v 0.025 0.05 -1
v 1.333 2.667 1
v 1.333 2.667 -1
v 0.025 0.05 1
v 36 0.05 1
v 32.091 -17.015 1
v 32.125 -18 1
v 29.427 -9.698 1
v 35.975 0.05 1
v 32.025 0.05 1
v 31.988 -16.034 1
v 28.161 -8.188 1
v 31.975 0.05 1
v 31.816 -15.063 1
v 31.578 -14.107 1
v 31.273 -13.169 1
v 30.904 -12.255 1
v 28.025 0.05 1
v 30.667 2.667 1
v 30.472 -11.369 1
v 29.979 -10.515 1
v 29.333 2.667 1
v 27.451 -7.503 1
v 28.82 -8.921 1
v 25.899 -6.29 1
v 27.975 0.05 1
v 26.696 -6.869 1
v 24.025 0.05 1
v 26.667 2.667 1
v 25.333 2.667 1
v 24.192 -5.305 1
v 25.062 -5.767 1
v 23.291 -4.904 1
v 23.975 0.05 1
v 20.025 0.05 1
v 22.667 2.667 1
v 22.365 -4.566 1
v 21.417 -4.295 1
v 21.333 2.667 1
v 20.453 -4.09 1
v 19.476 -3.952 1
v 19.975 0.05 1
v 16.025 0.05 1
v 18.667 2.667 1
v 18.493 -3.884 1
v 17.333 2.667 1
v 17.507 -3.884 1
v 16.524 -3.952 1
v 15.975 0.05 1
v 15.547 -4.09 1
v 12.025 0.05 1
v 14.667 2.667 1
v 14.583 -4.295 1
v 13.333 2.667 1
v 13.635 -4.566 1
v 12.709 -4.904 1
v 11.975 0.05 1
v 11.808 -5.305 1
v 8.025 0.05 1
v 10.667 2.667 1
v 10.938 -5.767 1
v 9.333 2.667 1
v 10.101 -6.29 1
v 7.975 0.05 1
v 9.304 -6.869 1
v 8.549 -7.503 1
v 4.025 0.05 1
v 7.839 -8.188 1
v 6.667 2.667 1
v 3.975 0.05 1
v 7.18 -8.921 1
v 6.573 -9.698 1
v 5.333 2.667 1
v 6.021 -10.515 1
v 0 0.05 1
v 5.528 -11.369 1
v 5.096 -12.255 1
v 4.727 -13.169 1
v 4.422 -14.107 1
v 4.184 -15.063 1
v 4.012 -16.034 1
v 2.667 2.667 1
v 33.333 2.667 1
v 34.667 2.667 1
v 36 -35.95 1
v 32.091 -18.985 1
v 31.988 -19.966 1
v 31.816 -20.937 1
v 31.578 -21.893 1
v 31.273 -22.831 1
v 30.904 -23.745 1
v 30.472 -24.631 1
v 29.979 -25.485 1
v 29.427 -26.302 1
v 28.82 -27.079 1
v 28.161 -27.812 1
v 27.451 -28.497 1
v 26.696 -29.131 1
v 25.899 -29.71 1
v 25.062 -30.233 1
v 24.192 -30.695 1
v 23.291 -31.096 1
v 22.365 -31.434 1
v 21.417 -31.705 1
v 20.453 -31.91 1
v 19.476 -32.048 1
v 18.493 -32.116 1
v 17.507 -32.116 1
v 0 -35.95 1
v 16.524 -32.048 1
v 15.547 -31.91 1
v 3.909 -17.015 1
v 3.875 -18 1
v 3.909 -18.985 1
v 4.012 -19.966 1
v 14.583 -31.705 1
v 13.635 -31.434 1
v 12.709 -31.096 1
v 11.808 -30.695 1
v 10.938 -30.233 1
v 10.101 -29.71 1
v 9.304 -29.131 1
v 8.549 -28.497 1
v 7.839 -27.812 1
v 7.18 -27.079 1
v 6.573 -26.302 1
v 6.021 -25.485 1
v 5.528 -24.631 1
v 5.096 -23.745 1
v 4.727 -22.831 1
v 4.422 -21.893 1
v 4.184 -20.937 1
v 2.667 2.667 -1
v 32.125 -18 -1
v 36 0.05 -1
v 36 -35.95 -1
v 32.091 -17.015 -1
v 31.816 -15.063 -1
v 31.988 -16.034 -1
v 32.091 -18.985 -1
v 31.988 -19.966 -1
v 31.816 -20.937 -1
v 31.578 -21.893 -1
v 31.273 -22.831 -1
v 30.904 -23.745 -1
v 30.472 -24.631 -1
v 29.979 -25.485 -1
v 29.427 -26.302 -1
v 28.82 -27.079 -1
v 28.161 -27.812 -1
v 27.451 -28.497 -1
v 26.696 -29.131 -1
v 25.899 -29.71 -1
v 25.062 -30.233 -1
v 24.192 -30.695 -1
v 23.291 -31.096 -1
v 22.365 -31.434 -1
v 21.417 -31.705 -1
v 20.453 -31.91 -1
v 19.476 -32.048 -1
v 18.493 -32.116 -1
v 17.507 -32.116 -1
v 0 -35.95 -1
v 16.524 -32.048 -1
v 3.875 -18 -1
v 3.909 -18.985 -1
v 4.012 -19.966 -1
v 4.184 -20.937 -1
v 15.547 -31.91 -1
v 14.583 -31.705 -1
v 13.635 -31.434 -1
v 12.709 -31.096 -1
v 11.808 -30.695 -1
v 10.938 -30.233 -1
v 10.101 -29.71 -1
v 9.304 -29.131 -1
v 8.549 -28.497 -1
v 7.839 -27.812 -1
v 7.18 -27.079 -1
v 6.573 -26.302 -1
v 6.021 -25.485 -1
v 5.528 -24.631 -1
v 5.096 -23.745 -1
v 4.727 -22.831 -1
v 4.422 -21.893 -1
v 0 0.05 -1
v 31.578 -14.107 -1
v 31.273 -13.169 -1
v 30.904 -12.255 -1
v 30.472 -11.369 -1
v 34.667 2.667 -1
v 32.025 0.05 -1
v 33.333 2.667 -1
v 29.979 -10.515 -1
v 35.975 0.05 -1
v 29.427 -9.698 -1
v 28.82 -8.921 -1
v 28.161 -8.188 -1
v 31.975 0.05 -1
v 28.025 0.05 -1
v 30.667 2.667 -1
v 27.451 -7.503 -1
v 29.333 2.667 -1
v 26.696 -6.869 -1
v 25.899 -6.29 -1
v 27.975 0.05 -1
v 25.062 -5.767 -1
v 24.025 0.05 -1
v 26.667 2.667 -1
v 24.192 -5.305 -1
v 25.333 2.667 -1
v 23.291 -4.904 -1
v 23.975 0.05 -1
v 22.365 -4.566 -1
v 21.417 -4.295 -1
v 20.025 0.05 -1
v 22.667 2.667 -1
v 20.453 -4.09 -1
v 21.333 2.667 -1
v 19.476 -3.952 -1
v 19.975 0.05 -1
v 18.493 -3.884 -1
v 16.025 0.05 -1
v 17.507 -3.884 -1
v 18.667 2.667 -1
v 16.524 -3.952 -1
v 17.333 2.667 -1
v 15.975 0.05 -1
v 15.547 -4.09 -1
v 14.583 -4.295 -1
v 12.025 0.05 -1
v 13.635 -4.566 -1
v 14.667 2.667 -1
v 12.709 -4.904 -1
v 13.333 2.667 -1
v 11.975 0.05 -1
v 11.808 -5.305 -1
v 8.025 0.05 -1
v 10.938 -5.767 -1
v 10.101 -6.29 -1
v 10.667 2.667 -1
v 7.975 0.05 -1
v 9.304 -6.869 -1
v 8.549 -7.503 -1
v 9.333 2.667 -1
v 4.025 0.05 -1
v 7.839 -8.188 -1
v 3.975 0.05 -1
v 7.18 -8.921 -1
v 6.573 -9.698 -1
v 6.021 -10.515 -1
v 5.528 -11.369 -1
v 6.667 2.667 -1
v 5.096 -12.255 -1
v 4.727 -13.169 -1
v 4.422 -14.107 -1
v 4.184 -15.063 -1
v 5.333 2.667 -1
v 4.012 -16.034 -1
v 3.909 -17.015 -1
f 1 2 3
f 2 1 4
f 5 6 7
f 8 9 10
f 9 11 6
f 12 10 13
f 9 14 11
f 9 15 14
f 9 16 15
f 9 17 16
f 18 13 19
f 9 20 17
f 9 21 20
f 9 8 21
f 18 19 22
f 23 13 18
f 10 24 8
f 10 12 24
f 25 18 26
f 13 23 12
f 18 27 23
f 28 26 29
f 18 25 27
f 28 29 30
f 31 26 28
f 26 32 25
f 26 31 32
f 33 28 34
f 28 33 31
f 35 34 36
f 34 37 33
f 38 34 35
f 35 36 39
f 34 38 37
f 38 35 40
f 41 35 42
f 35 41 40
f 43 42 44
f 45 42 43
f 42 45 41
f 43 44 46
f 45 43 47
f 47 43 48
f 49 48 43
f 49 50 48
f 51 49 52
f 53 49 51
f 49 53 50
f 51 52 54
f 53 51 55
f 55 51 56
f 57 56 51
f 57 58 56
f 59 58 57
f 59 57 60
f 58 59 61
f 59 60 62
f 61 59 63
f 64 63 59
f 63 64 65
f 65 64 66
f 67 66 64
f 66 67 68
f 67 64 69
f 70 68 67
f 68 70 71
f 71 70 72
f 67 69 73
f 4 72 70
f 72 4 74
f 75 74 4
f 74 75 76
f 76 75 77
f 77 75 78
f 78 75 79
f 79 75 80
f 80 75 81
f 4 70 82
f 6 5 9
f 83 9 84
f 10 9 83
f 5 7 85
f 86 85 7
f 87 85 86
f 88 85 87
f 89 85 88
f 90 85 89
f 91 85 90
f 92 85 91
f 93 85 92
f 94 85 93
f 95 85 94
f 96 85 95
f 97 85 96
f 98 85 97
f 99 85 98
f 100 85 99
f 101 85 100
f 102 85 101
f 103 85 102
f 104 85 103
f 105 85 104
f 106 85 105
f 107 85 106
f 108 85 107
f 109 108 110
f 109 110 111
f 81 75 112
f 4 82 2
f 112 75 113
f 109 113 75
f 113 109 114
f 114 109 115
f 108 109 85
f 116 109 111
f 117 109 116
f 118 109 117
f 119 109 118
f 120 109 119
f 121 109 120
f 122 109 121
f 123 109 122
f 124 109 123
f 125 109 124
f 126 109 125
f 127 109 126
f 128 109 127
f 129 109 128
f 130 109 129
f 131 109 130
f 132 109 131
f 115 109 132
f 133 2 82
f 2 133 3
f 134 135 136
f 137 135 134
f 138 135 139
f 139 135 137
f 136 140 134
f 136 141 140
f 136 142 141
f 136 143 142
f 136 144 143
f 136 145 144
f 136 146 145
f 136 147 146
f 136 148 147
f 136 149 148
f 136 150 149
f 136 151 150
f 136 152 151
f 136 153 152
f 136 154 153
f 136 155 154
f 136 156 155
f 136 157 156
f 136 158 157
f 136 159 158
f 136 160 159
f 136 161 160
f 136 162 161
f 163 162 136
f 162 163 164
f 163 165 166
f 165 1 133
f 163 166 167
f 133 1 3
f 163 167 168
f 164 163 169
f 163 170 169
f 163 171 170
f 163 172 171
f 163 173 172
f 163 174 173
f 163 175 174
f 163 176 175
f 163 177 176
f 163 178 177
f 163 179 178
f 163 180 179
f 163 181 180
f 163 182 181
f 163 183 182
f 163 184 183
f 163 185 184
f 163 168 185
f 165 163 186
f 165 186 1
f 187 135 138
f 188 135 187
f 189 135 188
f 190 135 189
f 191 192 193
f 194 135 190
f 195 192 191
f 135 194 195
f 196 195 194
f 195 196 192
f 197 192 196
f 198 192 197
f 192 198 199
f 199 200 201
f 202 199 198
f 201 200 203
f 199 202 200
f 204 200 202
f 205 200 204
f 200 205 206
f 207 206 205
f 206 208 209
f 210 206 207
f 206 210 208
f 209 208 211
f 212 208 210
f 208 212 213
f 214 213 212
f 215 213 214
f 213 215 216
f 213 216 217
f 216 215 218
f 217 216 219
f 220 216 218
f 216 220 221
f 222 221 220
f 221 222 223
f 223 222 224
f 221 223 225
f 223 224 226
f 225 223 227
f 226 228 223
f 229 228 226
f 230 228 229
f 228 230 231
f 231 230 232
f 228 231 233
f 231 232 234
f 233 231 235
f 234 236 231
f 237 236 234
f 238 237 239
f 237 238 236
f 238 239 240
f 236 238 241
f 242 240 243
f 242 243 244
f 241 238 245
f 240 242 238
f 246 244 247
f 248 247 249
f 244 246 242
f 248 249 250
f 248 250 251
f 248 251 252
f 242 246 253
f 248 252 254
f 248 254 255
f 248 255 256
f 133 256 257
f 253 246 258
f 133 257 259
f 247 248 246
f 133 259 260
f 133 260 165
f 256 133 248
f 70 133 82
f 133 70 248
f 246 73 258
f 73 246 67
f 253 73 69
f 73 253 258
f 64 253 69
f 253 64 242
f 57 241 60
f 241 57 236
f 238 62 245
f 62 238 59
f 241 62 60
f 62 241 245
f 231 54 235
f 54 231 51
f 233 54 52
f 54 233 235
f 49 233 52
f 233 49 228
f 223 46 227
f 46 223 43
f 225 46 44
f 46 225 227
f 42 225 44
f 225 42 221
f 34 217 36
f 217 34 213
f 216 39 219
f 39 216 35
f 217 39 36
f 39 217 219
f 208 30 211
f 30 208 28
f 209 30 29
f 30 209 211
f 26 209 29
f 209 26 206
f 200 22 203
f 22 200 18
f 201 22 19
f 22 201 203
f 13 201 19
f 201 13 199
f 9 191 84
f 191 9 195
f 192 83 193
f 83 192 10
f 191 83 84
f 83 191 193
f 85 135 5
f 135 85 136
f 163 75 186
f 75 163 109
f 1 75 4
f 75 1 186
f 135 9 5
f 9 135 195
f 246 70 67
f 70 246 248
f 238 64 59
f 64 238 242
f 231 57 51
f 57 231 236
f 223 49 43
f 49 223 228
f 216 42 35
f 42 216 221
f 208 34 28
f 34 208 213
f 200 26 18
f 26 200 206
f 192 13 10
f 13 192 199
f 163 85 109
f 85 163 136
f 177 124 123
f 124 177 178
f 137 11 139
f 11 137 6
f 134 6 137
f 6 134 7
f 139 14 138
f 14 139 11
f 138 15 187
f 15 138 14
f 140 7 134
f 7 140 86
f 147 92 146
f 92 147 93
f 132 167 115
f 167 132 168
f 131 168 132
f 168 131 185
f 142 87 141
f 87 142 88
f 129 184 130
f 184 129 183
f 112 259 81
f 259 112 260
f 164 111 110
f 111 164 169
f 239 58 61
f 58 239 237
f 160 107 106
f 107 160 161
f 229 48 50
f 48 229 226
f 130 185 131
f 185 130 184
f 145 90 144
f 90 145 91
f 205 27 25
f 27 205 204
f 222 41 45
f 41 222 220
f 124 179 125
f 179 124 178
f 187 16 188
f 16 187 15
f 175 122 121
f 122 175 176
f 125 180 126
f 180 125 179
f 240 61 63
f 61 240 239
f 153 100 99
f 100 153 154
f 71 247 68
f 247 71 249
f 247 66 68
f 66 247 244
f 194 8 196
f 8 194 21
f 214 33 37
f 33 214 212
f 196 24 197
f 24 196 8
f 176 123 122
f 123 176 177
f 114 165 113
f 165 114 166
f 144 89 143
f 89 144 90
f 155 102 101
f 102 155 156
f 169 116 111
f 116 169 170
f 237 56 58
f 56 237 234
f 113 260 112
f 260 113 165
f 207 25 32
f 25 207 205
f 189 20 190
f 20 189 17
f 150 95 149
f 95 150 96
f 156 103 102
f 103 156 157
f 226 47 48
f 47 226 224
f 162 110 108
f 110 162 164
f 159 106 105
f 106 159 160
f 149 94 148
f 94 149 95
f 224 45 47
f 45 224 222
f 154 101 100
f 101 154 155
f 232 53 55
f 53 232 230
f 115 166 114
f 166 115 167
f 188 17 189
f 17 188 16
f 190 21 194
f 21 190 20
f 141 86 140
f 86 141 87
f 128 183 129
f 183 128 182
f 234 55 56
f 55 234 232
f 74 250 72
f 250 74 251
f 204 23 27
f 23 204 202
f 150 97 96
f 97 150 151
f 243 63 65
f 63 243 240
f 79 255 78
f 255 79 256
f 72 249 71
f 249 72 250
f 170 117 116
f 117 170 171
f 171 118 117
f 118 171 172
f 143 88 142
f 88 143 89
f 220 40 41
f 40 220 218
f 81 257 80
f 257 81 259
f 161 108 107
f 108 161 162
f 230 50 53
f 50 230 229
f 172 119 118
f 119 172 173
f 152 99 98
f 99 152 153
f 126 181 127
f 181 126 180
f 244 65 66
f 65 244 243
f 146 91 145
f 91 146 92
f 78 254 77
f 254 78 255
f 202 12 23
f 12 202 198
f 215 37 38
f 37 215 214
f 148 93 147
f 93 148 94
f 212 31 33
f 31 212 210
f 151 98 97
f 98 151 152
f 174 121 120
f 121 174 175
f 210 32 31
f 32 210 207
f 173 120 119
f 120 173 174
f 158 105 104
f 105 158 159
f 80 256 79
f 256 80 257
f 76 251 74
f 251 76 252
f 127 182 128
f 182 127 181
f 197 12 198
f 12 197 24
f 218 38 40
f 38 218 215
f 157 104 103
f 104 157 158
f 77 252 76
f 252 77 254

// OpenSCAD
//******* change this to fit to your bottle ***********
// Pitch of the bottle thread in mm
thread_pitch = 4; 
// Outer diameter of bottle thread in mm
outer_d = 28.25;

//**************************************************

num = floor(outer_d/thread_pitch)+2;// number of teeth drawn.
pos = num*thread_pitch/2; //displacement of center of cylinder

delta = 0.05; //adjust for "zero walls"

difference() {
union(){    
translate([0,-num*thread_pitch+delta,-1])cube([num*thread_pitch,num*thread_pitch,2]);
for (i=[0:num-1])
translate([i*thread_pitch,0,0])linear_extrude(height = 2, center = true, convexity = 10,  slices = 20,  $fn = 16)
 polygon(points=[[0,0],[thread_pitch,0],[thread_pitch*2/3,thread_pitch*2/3],[thread_pitch*1/3,thread_pitch*2/3]]);
}
//cylinder 
 translate([pos,-pos,-1.5]) cylinder(d=outer_d,h=3,$fn=90);
}
